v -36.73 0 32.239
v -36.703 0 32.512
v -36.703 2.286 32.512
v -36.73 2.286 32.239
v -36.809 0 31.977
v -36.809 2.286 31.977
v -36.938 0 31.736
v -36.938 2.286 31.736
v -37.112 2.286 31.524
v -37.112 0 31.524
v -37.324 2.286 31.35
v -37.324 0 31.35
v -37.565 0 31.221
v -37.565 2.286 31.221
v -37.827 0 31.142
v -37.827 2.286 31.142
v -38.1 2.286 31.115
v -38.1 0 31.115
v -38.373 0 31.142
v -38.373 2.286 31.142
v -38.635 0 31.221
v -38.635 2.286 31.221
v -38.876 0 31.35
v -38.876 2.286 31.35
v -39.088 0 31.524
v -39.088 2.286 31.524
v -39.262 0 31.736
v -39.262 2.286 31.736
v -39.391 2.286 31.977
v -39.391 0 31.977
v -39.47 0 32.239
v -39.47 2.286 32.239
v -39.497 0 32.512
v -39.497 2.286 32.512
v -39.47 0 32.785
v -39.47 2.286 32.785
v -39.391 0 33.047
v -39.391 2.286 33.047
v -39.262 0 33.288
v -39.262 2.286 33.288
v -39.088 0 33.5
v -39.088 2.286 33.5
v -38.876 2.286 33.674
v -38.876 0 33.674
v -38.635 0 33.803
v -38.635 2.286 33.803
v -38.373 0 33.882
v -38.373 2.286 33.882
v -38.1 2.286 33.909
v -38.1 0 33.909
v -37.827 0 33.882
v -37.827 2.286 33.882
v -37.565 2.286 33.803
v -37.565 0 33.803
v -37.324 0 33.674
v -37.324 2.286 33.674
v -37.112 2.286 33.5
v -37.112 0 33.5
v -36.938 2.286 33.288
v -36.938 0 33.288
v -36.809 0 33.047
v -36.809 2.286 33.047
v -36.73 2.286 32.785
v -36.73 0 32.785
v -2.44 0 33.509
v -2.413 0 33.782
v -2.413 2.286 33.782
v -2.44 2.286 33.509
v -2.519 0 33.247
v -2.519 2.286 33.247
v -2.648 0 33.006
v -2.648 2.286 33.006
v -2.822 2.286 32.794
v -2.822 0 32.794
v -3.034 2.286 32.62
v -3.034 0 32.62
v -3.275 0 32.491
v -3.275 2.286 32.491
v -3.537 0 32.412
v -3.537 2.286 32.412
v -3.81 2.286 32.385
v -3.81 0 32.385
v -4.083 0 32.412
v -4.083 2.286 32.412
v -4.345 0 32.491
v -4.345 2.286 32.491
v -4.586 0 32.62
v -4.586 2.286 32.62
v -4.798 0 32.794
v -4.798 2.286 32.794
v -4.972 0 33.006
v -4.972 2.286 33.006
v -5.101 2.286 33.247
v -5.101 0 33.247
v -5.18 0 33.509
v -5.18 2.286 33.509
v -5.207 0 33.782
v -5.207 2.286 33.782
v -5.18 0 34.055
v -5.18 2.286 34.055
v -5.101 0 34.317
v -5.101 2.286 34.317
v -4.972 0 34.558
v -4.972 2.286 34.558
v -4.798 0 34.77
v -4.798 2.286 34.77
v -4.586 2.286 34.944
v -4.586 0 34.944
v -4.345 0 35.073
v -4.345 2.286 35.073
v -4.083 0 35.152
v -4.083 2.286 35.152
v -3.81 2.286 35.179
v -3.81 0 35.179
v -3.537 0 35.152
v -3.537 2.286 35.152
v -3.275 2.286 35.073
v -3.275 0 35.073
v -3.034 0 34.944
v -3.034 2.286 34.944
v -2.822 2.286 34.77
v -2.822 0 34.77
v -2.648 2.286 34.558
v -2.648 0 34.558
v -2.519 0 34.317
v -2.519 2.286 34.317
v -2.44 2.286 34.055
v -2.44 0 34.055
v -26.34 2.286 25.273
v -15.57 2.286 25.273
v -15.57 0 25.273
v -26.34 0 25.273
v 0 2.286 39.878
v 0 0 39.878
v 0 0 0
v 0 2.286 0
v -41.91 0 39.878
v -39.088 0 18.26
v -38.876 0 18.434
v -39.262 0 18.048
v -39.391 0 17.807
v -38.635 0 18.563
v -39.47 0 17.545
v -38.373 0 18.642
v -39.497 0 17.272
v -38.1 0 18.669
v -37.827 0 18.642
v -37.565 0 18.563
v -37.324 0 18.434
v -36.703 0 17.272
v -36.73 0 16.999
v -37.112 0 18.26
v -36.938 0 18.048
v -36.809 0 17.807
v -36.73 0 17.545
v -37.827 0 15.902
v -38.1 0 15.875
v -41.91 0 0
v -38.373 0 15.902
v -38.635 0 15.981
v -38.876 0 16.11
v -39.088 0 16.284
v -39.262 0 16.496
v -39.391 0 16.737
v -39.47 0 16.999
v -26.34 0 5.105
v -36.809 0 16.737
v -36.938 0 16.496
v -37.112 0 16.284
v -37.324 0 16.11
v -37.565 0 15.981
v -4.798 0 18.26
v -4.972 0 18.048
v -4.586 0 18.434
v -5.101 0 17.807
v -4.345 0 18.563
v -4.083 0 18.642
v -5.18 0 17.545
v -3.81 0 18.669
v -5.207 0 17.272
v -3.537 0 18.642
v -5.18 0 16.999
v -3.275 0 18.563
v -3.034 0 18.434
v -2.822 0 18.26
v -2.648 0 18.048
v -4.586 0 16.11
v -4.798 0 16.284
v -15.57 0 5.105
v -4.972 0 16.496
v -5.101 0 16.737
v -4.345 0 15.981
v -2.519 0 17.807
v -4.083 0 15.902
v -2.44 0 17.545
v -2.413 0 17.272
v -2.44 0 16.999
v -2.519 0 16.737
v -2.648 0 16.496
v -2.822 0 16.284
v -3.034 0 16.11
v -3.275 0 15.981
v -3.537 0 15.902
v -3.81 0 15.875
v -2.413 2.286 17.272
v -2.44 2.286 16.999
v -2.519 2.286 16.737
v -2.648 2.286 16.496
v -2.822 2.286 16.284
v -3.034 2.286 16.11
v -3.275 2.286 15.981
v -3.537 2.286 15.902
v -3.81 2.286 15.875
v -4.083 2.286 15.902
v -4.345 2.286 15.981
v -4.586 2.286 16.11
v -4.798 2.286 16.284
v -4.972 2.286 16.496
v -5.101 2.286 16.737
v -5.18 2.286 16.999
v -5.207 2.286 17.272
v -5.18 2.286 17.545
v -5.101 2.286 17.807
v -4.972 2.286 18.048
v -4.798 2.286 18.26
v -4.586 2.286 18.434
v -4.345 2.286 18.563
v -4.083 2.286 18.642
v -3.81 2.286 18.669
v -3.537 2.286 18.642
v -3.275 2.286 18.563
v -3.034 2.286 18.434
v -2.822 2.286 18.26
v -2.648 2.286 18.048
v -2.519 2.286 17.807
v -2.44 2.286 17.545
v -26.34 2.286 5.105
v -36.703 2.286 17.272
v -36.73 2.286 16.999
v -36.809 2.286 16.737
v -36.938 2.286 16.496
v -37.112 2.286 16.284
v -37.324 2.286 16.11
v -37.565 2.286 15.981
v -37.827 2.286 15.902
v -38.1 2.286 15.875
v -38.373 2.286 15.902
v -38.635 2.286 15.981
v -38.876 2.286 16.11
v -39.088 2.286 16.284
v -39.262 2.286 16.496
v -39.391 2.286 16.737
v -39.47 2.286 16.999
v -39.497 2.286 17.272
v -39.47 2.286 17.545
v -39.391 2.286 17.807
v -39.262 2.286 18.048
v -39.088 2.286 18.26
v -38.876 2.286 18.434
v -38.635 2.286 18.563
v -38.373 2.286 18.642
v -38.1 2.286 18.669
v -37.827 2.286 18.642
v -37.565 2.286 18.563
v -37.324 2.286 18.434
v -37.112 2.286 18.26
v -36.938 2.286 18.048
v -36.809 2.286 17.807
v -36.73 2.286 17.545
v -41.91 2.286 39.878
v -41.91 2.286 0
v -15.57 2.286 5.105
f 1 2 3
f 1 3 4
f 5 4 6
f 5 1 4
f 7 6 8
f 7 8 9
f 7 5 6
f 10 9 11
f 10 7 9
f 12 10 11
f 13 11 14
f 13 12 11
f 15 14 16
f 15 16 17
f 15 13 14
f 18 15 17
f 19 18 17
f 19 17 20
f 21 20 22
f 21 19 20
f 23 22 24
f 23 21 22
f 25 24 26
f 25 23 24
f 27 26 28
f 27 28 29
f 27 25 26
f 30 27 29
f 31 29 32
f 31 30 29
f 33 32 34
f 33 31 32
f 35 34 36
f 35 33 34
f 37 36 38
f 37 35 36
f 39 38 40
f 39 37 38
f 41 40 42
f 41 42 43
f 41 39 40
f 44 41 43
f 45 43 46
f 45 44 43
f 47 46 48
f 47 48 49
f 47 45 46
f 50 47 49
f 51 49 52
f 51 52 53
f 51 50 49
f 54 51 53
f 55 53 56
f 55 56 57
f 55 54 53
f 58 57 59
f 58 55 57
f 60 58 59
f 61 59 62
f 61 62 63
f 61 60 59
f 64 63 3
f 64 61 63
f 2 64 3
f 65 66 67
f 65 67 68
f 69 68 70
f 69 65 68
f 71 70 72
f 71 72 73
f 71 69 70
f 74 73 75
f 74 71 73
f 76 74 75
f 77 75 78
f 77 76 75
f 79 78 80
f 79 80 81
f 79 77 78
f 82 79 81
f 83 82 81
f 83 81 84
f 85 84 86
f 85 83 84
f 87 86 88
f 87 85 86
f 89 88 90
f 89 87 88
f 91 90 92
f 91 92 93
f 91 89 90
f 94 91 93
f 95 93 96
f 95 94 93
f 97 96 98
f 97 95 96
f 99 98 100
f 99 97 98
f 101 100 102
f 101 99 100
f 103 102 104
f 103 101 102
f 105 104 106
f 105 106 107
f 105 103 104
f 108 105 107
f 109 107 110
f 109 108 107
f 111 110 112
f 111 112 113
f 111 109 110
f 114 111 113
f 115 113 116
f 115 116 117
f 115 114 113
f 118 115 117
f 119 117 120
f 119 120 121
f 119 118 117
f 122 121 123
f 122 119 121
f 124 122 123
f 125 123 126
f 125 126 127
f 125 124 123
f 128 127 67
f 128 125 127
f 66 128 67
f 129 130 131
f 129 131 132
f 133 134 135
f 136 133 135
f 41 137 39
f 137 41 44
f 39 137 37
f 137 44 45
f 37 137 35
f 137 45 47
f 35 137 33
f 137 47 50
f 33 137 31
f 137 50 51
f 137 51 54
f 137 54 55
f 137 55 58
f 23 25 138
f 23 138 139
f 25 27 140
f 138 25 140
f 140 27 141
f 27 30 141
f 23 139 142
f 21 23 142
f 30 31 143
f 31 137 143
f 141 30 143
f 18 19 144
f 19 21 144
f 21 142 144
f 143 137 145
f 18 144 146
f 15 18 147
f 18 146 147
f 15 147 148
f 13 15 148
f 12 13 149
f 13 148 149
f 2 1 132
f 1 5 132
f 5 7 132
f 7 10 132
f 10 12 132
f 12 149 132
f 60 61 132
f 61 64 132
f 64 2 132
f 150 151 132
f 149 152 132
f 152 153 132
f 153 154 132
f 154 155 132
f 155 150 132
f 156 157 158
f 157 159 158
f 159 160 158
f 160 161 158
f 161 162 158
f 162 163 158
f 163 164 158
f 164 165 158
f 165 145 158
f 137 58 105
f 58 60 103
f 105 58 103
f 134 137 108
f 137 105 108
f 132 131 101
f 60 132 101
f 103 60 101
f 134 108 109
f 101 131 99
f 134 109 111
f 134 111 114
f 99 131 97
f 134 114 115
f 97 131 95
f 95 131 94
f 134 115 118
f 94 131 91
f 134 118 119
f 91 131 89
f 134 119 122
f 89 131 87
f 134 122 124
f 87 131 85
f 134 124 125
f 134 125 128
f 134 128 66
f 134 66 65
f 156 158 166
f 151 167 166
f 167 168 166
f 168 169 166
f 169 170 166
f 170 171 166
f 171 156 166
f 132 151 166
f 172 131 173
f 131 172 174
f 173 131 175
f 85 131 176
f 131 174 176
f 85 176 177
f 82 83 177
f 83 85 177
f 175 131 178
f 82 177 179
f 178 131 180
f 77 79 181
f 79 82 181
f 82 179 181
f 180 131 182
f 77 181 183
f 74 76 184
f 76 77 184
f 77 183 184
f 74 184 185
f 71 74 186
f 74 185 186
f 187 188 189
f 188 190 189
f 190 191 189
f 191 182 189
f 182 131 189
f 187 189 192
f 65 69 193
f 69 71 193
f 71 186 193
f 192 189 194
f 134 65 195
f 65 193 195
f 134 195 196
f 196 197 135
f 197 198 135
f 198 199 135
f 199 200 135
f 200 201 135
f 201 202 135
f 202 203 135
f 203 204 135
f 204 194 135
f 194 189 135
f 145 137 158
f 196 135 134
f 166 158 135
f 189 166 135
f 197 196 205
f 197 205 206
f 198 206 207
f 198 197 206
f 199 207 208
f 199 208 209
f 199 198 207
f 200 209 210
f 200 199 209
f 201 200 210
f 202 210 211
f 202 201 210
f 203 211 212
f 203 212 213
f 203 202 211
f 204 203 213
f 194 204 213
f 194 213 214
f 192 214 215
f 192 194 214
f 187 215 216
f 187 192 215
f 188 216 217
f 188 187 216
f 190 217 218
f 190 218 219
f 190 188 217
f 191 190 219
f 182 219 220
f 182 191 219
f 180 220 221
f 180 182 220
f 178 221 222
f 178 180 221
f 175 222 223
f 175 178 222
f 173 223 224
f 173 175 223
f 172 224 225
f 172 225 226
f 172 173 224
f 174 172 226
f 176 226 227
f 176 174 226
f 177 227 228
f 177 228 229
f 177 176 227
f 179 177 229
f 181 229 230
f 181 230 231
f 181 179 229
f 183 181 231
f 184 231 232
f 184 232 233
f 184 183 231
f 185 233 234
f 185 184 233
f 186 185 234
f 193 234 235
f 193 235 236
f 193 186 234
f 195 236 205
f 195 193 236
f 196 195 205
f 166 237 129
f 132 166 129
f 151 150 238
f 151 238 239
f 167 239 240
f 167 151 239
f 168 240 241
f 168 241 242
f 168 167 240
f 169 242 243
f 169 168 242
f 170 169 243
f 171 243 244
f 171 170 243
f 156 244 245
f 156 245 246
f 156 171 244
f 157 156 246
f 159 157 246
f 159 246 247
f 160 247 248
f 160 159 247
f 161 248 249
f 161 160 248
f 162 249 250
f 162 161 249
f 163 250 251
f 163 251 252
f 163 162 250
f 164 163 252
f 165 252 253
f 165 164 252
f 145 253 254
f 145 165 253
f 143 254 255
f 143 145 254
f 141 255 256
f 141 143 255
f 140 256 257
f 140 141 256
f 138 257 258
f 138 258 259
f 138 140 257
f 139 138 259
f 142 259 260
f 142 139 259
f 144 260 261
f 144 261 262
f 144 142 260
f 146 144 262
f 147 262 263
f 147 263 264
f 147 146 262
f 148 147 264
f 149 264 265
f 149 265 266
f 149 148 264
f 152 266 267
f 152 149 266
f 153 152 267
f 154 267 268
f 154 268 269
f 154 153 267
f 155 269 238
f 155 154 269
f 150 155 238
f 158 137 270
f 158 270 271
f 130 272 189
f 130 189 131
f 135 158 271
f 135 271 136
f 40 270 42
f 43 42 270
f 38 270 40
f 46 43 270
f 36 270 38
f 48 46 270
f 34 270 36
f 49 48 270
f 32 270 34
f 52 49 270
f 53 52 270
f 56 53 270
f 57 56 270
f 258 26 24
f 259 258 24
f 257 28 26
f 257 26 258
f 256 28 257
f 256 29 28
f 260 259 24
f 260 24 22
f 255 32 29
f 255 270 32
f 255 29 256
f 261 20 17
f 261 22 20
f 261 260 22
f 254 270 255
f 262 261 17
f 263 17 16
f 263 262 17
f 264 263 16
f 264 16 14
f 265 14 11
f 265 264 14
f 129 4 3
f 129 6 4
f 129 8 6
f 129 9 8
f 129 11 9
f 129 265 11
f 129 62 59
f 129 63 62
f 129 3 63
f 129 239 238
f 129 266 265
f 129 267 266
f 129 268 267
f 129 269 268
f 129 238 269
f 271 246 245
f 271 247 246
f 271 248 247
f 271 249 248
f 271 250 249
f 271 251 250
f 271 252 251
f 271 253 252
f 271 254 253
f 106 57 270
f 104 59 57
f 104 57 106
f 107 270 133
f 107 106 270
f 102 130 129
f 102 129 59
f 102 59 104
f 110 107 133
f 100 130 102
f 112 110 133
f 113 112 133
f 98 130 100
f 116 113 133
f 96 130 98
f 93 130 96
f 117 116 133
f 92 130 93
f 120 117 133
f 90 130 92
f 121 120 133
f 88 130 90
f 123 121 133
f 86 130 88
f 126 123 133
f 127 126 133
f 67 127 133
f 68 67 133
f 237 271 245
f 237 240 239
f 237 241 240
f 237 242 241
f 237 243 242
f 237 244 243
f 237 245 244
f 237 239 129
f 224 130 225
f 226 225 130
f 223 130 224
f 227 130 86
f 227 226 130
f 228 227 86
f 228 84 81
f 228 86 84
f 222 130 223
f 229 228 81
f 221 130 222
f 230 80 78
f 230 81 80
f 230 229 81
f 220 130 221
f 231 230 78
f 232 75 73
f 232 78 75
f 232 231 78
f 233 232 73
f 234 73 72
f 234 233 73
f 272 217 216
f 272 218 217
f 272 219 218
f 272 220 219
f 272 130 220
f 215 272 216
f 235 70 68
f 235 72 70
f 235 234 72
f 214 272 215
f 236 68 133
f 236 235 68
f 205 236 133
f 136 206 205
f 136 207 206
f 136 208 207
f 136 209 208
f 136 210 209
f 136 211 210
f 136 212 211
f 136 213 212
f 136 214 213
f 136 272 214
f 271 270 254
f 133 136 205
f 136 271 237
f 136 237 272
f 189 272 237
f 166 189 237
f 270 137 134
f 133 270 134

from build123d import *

# Parameters (mm, degrees)
SKETCH5_W      = 41.91
SKETCH5_H      = 39.878
SKETCH5_R      = 1.397
EXTRUDE3_DEPTH = 2.286
SKETCH6_W      = 10.7696
SKETCH6_H      = 20.1676
EXTRUDE4_DEPTH = 3.286


with BuildPart() as part:
    # Sketch5 → Extrude3 (new body)
    with BuildSketch(Plane(origin=(0, 0, 0), x_dir=(1, 0, 0), z_dir=(0, 1, 0))):
        with Locations((-20.955, -19.939)):
            Rectangle(SKETCH5_W, SKETCH5_H)
        with Locations((-38.1, -17.272)):
            Circle(SKETCH5_R, mode=Mode.SUBTRACT)
        with Locations((-38.1, -32.512)):
            Circle(SKETCH5_R, mode=Mode.SUBTRACT)
        with Locations((-3.81, -33.782)):
            Circle(SKETCH5_R, mode=Mode.SUBTRACT)
        with Locations((-3.81, -17.272)):
            Circle(SKETCH5_R, mode=Mode.SUBTRACT)
    extrude(amount=EXTRUDE3_DEPTH)

    # Sketch6 → Extrude4 (cut, through all)
    with BuildSketch(Plane(origin=(0, 2.286, 0), x_dir=(-1, 0, 0), z_dir=(0, 1, 0))):
        with Locations((20.955, 15.1892)):
            Rectangle(SKETCH6_W, SKETCH6_H)
    extrude(amount=-EXTRUDE4_DEPTH, mode=Mode.SUBTRACT)


solid = part.part
